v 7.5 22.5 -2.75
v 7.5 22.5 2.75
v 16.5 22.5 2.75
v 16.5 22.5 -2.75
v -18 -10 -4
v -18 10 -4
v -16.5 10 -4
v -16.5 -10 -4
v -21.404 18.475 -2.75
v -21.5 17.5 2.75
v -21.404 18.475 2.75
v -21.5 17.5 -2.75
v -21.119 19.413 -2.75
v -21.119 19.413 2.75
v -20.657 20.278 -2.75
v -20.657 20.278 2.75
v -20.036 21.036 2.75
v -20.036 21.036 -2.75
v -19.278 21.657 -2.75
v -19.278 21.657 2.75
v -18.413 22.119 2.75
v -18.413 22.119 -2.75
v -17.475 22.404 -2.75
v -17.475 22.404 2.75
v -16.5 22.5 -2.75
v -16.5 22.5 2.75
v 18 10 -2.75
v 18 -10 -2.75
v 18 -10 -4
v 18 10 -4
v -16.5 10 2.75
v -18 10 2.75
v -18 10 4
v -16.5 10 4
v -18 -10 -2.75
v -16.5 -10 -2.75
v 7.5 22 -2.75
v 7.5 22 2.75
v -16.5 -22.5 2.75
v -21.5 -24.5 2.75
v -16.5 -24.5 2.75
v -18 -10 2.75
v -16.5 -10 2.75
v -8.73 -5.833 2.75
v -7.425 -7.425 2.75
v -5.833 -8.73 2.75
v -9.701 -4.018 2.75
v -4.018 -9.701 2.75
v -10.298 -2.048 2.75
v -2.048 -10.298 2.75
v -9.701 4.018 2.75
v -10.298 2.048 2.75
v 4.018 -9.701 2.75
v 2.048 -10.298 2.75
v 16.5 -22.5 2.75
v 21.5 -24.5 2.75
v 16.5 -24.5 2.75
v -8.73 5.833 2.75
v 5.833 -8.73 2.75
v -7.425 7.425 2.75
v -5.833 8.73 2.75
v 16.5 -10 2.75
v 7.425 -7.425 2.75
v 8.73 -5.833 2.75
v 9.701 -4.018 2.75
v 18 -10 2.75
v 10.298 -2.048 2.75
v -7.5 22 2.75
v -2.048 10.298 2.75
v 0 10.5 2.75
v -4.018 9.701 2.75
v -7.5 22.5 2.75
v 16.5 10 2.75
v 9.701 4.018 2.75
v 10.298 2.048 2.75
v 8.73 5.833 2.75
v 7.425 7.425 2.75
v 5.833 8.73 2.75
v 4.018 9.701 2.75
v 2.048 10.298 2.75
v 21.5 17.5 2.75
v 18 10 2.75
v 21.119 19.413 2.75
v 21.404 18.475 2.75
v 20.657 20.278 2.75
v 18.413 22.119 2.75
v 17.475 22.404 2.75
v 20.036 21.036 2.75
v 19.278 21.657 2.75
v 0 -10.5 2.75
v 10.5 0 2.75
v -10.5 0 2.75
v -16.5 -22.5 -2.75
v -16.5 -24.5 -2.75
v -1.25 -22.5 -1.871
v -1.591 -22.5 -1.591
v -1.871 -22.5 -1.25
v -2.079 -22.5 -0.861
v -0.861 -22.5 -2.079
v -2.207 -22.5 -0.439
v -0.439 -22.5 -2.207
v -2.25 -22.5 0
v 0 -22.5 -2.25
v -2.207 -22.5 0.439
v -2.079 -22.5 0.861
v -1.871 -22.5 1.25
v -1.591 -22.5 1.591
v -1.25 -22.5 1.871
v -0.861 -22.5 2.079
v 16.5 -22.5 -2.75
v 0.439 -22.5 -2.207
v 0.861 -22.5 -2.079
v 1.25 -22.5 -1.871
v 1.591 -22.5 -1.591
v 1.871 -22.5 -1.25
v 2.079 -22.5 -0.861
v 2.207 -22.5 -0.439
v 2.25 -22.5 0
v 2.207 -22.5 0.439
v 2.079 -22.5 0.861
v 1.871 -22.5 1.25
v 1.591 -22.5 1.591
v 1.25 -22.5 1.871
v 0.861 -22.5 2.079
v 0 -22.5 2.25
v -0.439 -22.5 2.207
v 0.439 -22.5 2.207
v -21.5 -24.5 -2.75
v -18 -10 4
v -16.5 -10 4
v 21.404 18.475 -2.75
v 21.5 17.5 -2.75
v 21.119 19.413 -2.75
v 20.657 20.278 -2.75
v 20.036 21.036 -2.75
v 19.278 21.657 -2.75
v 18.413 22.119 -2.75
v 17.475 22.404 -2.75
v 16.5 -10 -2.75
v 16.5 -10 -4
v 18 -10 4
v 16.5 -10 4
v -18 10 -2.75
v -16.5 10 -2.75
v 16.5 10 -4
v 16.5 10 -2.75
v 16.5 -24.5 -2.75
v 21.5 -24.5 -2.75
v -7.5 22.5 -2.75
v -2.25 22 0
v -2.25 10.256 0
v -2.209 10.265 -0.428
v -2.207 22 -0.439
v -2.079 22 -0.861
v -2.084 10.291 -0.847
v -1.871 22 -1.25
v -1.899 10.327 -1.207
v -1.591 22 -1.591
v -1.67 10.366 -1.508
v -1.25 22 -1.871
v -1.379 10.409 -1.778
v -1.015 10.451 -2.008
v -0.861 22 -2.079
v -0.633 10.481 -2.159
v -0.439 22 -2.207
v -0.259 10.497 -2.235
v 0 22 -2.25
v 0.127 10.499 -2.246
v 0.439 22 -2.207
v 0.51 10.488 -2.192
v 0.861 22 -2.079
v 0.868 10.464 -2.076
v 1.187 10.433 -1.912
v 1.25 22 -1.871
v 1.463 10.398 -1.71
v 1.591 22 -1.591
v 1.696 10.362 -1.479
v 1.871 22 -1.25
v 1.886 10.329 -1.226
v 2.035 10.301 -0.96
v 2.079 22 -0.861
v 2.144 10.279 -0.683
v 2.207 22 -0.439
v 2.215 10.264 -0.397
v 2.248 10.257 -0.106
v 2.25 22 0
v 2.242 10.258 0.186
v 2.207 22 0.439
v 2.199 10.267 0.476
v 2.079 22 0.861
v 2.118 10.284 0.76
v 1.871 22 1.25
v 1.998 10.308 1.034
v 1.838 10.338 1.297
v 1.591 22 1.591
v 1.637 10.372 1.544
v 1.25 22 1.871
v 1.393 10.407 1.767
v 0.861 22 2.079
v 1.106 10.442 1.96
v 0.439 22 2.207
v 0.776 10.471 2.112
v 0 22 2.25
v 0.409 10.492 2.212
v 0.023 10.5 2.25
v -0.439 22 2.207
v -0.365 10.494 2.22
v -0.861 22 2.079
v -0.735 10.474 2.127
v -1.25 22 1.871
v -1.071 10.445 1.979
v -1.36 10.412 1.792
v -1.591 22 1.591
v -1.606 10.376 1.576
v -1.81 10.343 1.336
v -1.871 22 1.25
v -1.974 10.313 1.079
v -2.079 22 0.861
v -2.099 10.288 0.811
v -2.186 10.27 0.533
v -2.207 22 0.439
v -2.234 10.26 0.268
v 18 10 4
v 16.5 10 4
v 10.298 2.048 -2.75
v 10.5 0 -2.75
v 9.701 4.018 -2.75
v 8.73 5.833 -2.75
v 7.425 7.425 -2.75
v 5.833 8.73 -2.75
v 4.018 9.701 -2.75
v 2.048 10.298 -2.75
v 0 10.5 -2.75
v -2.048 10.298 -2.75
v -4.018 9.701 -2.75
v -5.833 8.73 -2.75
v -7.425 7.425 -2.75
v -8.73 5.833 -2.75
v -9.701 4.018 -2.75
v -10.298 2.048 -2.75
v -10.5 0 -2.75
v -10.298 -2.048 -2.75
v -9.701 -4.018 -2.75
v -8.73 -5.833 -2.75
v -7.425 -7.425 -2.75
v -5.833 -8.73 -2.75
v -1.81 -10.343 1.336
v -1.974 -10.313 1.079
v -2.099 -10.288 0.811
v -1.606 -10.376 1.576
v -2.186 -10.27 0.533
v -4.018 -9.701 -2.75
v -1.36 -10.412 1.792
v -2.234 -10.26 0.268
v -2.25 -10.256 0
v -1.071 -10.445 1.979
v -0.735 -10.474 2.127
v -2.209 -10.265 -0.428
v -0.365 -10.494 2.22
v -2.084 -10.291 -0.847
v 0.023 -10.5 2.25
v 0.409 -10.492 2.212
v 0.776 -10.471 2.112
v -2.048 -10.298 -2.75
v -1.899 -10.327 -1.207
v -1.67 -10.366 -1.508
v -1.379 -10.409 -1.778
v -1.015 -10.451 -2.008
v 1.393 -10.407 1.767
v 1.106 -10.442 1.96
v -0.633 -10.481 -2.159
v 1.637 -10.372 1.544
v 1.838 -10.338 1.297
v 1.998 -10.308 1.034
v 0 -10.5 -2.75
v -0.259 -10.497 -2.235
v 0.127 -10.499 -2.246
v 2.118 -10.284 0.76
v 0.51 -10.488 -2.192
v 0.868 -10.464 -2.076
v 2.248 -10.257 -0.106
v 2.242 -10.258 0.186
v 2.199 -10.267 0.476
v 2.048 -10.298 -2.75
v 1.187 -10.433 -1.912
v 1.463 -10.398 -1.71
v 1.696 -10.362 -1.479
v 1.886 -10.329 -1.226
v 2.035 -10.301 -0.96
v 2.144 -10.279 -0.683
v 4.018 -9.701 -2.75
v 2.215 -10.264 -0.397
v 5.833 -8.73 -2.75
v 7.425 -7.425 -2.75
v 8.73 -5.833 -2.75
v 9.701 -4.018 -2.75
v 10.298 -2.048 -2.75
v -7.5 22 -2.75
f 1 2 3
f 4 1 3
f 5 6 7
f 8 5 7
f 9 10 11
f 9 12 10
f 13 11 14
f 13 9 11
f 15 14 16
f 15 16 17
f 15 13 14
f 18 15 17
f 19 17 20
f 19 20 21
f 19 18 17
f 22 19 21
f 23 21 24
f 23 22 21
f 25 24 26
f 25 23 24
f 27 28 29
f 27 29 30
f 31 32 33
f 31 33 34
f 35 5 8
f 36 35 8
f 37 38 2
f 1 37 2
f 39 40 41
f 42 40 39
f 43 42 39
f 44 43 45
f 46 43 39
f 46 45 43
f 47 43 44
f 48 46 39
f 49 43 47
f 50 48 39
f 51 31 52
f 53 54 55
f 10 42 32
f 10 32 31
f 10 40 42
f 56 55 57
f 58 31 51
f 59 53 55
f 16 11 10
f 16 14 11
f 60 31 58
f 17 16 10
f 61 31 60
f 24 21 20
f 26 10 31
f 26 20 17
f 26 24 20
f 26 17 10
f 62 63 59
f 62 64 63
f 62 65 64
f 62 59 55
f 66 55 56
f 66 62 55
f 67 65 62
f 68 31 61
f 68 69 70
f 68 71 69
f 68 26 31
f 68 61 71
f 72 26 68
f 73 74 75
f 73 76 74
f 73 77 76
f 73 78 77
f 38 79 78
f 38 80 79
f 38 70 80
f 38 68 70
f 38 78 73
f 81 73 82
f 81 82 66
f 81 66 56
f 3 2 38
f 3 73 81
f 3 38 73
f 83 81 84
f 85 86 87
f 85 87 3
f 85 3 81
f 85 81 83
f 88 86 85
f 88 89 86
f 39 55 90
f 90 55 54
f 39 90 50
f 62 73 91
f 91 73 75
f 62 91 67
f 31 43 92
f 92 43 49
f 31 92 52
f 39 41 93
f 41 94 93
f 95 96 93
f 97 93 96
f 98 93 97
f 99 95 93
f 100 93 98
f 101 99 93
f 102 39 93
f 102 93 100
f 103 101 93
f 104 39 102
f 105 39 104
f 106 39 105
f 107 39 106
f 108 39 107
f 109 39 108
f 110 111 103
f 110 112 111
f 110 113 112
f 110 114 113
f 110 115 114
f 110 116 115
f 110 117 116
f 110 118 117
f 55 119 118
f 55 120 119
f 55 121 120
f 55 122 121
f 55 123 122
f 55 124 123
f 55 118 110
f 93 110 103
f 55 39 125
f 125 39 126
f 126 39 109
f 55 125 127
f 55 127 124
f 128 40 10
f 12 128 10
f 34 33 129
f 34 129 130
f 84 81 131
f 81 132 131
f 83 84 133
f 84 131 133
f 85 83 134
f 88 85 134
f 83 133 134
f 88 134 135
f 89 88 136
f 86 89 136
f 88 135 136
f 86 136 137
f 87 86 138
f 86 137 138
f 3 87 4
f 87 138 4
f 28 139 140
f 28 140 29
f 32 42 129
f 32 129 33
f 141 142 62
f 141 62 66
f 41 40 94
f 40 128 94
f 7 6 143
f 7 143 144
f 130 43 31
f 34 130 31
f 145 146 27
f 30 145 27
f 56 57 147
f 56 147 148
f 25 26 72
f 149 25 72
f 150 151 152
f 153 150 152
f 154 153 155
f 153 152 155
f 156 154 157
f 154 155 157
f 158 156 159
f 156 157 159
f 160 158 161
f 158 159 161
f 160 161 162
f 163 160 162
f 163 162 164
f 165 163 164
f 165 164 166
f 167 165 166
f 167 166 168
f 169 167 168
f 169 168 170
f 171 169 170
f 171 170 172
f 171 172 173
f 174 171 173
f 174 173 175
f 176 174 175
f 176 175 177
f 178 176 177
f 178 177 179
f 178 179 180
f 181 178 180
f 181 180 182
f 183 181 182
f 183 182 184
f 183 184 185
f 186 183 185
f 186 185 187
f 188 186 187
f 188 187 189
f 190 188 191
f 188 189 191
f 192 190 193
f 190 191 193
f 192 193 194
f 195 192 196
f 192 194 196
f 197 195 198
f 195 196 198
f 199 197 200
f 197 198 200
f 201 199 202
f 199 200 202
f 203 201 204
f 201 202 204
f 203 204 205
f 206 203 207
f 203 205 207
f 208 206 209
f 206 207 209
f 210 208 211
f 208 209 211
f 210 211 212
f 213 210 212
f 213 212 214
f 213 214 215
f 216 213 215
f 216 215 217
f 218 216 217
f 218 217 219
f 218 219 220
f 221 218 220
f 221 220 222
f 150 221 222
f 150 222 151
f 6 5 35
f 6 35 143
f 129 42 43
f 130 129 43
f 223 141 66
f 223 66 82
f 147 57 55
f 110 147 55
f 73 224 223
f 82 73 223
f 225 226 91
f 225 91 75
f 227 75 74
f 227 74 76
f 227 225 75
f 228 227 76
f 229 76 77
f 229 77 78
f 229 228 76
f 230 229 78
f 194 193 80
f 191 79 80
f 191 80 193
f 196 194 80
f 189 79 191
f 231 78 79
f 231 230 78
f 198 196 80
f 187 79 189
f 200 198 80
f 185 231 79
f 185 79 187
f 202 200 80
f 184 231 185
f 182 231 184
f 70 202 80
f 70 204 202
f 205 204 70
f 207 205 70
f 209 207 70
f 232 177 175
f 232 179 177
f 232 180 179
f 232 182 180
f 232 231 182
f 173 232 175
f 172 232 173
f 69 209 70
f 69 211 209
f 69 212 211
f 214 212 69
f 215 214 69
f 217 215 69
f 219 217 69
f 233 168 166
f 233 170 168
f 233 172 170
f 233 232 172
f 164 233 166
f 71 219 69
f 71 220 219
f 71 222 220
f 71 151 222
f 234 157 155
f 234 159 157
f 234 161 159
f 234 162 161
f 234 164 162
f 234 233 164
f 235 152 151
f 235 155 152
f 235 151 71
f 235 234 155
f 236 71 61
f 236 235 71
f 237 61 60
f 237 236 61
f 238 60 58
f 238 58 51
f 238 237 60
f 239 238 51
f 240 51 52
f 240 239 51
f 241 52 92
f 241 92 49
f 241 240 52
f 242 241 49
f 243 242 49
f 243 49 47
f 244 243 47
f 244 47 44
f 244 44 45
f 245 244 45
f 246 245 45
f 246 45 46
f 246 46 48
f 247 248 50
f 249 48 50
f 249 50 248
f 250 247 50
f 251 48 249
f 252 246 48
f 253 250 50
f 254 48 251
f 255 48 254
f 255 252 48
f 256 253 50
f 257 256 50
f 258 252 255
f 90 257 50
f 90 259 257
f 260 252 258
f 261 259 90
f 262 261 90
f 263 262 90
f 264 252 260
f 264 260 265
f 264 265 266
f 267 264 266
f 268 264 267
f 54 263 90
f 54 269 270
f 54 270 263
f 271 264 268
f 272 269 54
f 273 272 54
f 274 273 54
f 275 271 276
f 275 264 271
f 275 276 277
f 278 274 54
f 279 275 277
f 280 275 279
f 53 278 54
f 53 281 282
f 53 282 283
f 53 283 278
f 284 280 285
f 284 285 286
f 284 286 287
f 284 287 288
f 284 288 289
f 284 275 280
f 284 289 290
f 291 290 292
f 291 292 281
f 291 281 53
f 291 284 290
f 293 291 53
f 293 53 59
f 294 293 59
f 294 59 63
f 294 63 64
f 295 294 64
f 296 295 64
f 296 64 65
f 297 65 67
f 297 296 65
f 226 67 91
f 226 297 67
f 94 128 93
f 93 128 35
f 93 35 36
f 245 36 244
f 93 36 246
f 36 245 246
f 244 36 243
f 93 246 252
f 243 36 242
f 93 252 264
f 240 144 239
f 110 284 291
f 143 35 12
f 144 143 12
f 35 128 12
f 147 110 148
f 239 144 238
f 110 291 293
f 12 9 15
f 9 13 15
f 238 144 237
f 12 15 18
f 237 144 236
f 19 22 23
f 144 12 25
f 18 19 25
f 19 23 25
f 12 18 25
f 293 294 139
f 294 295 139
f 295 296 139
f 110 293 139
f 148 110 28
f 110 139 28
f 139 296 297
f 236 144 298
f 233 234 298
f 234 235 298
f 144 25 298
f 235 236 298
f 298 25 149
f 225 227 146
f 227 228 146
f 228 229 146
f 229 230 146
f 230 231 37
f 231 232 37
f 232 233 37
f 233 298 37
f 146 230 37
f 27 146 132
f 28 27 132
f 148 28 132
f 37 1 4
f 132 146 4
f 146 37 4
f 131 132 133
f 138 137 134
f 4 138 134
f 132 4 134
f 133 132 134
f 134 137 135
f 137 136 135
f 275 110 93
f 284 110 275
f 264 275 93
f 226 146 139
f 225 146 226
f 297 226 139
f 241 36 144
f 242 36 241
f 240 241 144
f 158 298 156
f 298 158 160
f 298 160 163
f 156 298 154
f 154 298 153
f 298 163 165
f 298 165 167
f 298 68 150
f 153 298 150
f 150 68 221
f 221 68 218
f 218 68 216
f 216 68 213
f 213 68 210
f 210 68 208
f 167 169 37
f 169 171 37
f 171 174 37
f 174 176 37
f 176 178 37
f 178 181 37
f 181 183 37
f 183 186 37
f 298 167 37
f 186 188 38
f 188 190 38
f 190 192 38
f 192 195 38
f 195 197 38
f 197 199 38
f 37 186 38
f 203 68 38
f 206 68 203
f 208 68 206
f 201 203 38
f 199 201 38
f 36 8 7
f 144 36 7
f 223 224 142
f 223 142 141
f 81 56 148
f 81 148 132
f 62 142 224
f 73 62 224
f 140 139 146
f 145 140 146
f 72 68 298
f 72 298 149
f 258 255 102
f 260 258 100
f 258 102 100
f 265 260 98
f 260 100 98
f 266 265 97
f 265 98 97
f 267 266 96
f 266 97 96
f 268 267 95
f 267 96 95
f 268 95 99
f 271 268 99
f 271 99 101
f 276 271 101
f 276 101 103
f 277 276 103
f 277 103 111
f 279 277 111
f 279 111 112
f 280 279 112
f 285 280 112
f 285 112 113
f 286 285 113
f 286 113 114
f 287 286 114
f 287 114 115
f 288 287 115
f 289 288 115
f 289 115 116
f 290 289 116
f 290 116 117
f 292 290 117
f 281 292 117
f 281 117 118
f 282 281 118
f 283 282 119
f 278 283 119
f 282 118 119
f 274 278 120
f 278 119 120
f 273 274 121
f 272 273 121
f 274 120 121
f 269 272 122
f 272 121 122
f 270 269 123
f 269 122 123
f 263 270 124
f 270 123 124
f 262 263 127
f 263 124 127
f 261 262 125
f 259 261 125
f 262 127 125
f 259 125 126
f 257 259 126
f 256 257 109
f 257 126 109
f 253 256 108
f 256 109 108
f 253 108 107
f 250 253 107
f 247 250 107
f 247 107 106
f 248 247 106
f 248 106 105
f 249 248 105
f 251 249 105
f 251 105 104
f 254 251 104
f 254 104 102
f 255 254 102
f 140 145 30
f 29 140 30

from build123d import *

# Parameters (mm, degrees)
SKETCH1_W            = 43
SKETCH1_H            = 45
SKETCH1_R            = 10.5
BOSS_EXTRUDE1_DEPTH  = 2.75
FILLET1_R            = 5
SKETCH2_W            = 15
SKETCH2_H            = 0.5
CUT_EXTRUDE1_DEPTH   = 10
M4_CLEARANCE_HOLE1_D = 4.5
SKETCH5_W            = 1.5
SKETCH5_H            = 20
BOSS_EXTRUDE2_DEPTH  = 4
SKETCH6_W            = 5
SKETCH6_H            = 2
BOSS_EXTRUDE3_DEPTH  = 2.75


with BuildPart() as part:
    # Sketch1 → Boss-Extrude1 (new, symmetric)
    with BuildSketch(Plane.XY):
        Rectangle(SKETCH1_W, SKETCH1_H)
        Circle(SKETCH1_R, mode=Mode.SUBTRACT)
    extrude(amount=BOSS_EXTRUDE1_DEPTH, both=True)

    # Fillet1
    fillet1_edges = [part.edges().sort_by_distance(p)[0] for p in [
        (-21.5, 22.5, 0),
        (21.5, 22.5, 0),
    ]]
    fillet(fillet1_edges, radius=FILLET1_R)

    # Sketch2 → Cut-Extrude1 (cut)
    with BuildSketch(Plane.XY.offset(2.75)):
        with Locations((0, 22.25)):
            Rectangle(SKETCH2_W, SKETCH2_H)
    extrude(amount=-CUT_EXTRUDE1_DEPTH, mode=Mode.SUBTRACT)

    # M4 Clearance Hole1 (through all)
    with Locations(Plane(origin=(0, 22, 0), x_dir=(1, 0, 0), z_dir=(0, 1, 0))):
        with Locations((0, 0)):
            Hole(M4_CLEARANCE_HOLE1_D / 2)

    # Sketch5 → Boss-Extrude2 (add, symmetric)
    with BuildSketch(Plane.XY):
        with Locations((-17.25, 0)):
            Rectangle(SKETCH5_W, SKETCH5_H)
        with Locations((17.25, 0)):
            Rectangle(SKETCH5_W, SKETCH5_H)
    extrude(amount=BOSS_EXTRUDE2_DEPTH, both=True)

    # Sketch6 → Boss-Extrude3 (add, symmetric)
    with BuildSketch(Plane.XY):
        with Locations((-19, -23.5)):
            Rectangle(SKETCH6_W, SKETCH6_H)
        with Locations((19, -23.5)):
            Rectangle(SKETCH6_W, SKETCH6_H)
    extrude(amount=BOSS_EXTRUDE3_DEPTH, both=True)


solid = part.part
